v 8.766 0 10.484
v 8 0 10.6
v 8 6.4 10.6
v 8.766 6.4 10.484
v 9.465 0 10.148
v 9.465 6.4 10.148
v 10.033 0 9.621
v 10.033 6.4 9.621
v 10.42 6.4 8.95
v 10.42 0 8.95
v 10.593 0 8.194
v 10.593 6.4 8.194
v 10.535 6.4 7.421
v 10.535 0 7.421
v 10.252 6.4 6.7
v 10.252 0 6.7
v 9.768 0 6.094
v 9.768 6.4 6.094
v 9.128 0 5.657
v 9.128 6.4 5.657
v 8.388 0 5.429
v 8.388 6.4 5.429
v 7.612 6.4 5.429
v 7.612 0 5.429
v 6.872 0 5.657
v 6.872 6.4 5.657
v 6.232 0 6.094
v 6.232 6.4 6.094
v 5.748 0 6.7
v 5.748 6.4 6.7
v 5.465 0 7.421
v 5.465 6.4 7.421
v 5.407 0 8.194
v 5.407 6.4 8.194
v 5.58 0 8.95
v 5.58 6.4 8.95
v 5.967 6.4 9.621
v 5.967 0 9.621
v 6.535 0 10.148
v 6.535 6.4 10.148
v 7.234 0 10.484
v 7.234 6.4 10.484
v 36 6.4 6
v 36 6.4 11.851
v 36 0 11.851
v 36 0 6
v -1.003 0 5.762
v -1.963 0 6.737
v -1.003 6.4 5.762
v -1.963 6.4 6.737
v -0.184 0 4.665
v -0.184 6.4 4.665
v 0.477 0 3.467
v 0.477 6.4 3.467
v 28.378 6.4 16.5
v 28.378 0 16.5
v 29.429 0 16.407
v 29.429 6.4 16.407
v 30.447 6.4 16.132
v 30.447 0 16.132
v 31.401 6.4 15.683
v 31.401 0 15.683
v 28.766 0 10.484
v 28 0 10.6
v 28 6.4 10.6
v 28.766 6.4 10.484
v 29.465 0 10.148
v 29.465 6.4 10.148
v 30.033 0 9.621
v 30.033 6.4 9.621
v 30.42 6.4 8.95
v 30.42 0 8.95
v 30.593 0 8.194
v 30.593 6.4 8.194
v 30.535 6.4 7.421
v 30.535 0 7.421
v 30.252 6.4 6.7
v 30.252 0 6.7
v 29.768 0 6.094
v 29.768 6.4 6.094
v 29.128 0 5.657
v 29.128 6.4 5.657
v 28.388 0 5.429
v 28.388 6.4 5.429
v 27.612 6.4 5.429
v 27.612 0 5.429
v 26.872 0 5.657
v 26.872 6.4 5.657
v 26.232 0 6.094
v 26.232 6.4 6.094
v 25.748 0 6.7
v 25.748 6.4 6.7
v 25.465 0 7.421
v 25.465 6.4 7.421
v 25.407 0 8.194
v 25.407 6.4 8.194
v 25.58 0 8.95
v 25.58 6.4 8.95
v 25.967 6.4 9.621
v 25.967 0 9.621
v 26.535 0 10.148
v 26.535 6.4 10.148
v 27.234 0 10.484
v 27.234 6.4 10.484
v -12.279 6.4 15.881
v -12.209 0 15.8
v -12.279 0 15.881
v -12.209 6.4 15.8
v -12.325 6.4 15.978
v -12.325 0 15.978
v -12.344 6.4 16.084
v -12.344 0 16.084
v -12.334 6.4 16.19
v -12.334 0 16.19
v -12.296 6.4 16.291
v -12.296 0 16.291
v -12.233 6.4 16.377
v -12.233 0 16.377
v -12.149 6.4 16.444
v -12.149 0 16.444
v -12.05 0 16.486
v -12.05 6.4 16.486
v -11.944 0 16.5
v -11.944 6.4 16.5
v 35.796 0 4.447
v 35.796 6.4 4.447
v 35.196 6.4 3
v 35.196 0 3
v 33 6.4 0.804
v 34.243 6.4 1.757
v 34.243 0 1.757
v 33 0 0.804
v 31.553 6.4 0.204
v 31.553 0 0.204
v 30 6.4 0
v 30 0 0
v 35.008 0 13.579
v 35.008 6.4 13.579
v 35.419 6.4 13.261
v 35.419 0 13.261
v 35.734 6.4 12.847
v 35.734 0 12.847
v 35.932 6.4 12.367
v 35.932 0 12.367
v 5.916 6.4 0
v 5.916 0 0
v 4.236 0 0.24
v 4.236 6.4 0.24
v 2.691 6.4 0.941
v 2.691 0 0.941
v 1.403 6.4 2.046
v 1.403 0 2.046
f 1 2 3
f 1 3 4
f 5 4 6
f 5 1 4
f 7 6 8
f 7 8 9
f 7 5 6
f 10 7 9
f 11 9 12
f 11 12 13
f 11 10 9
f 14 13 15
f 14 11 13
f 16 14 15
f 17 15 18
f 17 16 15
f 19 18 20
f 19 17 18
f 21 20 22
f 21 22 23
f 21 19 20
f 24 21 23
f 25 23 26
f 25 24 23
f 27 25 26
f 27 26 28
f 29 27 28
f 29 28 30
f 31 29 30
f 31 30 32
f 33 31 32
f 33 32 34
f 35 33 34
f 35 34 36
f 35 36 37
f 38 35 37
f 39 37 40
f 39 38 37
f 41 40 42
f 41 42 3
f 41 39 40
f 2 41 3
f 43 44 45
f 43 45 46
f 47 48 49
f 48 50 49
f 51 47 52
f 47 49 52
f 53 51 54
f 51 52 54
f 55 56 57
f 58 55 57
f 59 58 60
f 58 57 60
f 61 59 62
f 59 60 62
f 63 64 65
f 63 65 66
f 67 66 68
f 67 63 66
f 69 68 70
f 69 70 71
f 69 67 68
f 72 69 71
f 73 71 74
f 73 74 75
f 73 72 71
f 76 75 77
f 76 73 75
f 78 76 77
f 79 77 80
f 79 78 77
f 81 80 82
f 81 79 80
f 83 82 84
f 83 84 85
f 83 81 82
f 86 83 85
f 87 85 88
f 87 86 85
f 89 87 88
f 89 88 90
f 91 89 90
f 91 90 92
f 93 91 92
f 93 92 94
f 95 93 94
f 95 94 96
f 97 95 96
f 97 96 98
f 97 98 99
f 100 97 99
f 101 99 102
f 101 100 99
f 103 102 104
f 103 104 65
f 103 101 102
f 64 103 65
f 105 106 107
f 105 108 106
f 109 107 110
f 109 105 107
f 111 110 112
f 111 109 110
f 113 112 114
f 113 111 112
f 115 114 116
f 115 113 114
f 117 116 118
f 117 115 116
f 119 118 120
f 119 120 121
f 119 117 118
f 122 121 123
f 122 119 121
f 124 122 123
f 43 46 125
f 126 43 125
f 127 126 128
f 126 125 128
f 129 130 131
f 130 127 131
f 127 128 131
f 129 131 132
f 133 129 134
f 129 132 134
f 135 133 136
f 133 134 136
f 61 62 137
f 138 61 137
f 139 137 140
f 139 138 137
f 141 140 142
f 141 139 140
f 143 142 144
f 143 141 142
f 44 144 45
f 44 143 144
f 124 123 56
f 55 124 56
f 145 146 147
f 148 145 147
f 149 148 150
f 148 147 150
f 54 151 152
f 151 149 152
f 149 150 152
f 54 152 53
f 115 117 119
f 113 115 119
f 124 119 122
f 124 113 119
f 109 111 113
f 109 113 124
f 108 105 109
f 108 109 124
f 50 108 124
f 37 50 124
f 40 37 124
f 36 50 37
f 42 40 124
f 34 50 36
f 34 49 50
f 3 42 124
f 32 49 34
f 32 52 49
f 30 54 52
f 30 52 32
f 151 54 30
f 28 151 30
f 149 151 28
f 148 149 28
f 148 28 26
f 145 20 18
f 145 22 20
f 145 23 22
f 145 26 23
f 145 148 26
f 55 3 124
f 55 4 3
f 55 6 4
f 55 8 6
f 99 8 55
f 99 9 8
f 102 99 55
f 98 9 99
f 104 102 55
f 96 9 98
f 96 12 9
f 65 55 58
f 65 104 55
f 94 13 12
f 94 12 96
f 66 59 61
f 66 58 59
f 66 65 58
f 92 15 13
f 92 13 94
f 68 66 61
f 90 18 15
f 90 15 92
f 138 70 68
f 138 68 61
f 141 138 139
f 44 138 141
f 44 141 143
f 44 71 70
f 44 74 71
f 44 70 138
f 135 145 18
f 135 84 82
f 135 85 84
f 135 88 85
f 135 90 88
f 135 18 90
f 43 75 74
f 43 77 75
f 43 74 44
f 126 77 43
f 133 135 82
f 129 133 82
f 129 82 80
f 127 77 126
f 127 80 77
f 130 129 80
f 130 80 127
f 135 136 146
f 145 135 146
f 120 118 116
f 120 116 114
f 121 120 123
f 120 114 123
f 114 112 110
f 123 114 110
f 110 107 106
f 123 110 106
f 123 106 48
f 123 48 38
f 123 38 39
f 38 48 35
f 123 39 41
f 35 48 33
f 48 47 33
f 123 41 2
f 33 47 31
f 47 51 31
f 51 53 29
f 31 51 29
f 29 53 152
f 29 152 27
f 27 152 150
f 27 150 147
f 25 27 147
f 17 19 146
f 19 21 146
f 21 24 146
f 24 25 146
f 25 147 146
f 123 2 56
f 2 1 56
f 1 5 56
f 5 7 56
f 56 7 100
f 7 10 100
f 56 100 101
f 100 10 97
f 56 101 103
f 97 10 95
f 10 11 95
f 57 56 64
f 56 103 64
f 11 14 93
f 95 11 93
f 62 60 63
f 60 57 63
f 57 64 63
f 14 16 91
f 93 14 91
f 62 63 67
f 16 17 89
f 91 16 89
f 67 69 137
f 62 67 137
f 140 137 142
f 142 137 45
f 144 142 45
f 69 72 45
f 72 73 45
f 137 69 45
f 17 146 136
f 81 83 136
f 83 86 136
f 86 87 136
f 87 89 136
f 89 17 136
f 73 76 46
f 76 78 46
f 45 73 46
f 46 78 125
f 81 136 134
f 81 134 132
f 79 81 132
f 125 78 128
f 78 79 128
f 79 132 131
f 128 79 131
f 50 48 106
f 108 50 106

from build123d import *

# Parameters (mm, degrees)
SKETCH1_R           = 2.6
BOSS_EXTRUDE1_DEPTH = 6.4
FILLET1_R           = 6
FILLET2_R           = 10
FILLET3_R           = 0.4
FILLET4_R           = 2


with BuildPart() as part:
    # Sketch1 → Boss-Extrude1 (new body)
    with BuildSketch(Plane(origin=(0, 0, 0), x_dir=(1, 0, 0), z_dir=(0, 1, 0))):
        Polygon((36, -13), (36, 0), (0, 0), (0, -5), (-13, -16.5), (-1.455462178, -16.5), (30, -16.5), align=None)
        with Locations(Location((28, -8, 0), (0, 0, 270))):
            Circle(SKETCH1_R, mode=Mode.SUBTRACT)
        with Locations(Location((8, -8, 0), (0, 0, 270))):
            Circle(SKETCH1_R, mode=Mode.SUBTRACT)
    extrude(amount=BOSS_EXTRUDE1_DEPTH)

    # Fillet1
    # the kernel refuses this fillet: 6 mm, written as the material it takes off along each edge
    with BuildSketch(Plane(origin=(30, -4.05523712, 16.5), x_dir=(-1, 0, 0), z_dir=(0, 1, 0))) as fillet1_piece_1:
        with BuildLine():
            CenterArc((FILLET1_R * 0.27034914135, -FILLET1_R), FILLET1_R, 90, 30.256437164)
            Line((-FILLET1_R * 0.233521884174, -FILLET1_R * 0.136221099102), (-FILLET1_R * 0.243599304685, -FILLET1_R * 0.118945521084))
            Line((-FILLET1_R * 0.243599304685, -FILLET1_R * 0.118945521084), (-FILLET1_R * 0.005406982827, FILLET1_R * 0.02))
            Line((-FILLET1_R * 0.005406982827, FILLET1_R * 0.02), (FILLET1_R * 0.27034914135, FILLET1_R * 0.02))
            Line((FILLET1_R * 0.27034914135, FILLET1_R * 0.02), (FILLET1_R * 0.27034914135, 0))
        make_face()
    extrude(amount=14.51047424, mode=Mode.SUBTRACT)
    with BuildSketch(Plane(origin=(36, -15, 0), x_dir=(0, 0, 1), z_dir=(0, 1, 0))) as fillet1_piece_2:
        with BuildLine():
            CenterArc((FILLET1_R, -FILLET1_R), FILLET1_R, 90, 90)
            Line((0, -FILLET1_R), (-FILLET1_R * 0.02, -FILLET1_R))
            Line((-FILLET1_R * 0.02, -FILLET1_R), (-FILLET1_R * 0.02, FILLET1_R * 0.02))
            Line((-FILLET1_R * 0.02, FILLET1_R * 0.02), (FILLET1_R, FILLET1_R * 0.02))
            Line((FILLET1_R, FILLET1_R * 0.02), (FILLET1_R, 0))
        make_face()
    extrude(amount=36.4, mode=Mode.SUBTRACT)
    with BuildSketch(Plane(origin=(0, -14.790199458, 0), x_dir=(0, 0, 1), z_dir=(0, 1, 0))) as fillet1_piece_3:
        with BuildLine():
            CenterArc((6, 5.916079783), FILLET1_R, 180, 80.405931773)
            Line((0, 5.916079783), (-0.12, 5.916079783))
            Line((-0.12, 5.916079783), (-0.12, 0))
            Line((-0.12, 0), (0, -0.12))
            ThreePointArc((0, -0.12), (2.5, -0.12), (4.98, -0.118321596))
            Line((4.98, -0.118321596), (5, 0))
        make_face()
    extrude(amount=35.980398916, mode=Mode.SUBTRACT)

    # Fillet2
    fillet2_edges = [part.edges().sort_by_distance(p)[0] for p in [
        (0, 3.2, 5),
    ]]
    fillet(fillet2_edges, radius=FILLET2_R)

    # Fillet3
    fillet3_edges = [part.edges().sort_by_distance(p)[0] for p in [
        (-13, 3.2, 16.5),
    ]]
    fillet(fillet3_edges, radius=FILLET3_R)

    # Fillet4
    fillet4_edges = [part.edges().sort_by_distance(p)[0] for p in [
        (36, 3.2, 13),
    ]]
    fillet(fillet4_edges, radius=FILLET4_R)


solid = part.part
